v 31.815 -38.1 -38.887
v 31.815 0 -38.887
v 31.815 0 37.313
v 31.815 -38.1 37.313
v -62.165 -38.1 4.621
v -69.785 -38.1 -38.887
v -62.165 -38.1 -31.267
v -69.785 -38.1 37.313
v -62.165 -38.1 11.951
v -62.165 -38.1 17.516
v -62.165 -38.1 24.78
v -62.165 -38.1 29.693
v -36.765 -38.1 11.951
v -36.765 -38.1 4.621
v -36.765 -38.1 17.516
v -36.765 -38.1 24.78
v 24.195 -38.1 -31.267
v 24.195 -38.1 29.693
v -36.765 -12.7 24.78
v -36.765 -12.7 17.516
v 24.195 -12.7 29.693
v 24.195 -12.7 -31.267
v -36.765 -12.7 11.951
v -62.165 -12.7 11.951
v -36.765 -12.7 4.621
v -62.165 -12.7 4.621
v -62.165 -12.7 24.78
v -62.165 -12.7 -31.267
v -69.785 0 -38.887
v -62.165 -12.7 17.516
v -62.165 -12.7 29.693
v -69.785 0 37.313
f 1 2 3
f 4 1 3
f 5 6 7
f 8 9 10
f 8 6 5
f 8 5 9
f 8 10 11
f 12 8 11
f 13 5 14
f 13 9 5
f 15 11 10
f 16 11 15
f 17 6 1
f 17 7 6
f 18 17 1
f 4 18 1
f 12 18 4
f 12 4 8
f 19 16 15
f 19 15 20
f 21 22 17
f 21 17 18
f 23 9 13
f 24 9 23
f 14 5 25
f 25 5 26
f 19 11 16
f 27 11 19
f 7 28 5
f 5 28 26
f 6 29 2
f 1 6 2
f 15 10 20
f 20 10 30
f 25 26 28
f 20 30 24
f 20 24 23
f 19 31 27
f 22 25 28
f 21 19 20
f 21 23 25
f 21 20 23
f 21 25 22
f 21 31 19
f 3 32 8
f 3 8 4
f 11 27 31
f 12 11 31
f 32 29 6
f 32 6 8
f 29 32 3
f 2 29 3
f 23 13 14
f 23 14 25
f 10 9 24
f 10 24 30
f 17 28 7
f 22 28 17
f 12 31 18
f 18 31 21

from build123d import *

# Parameters (mm, degrees)
F0_W     = 101.6
F0_H     = 76.2
F0_W_2   = 86.36
F0_H_2   = 60.96
F1_DEPTH = 38.1
F2_DEPTH = 12.7
F3_W     = 25.4
F3_H     = 7.263597
F4_DEPTH = 25.4
F5_W     = 25.4
F5_H     = 7.33001
F6_DEPTH = 25.4


with BuildPart() as f1:
    # F0 (on Front) → F1 (new body)
    with BuildSketch(Plane.XZ):
        with Locations((-18.985149, -0.786755)):
            Rectangle(F0_W, F0_H)
        with Locations((-18.985149, -0.786755)):
            Rectangle(F0_W_2, F0_H_2, mode=Mode.SUBTRACT)
    extrude(amount=F1_DEPTH)

    # F0 (on Front) → F2 (join)
    with BuildSketch(Plane.XZ):
        with Locations((-18.985149, -0.786755)):
            Rectangle(F0_W_2, F0_H_2)
    extrude(amount=F2_DEPTH)

    # F3 (on face) → F4 (join)
    with BuildSketch(Plane.YZ.offset(-62.165149)):
        with Locations((-25.4, 21.148253)):
            Rectangle(F3_W, F3_H)
    extrude(amount=F4_DEPTH)

    # F5 (on face) → F6 (join)
    with BuildSketch(Plane.YZ.offset(-62.165149)):
        with Locations((-25.4, 8.285583)):
            Rectangle(F5_W, F5_H)
    extrude(amount=F6_DEPTH)


solid = f1.part
